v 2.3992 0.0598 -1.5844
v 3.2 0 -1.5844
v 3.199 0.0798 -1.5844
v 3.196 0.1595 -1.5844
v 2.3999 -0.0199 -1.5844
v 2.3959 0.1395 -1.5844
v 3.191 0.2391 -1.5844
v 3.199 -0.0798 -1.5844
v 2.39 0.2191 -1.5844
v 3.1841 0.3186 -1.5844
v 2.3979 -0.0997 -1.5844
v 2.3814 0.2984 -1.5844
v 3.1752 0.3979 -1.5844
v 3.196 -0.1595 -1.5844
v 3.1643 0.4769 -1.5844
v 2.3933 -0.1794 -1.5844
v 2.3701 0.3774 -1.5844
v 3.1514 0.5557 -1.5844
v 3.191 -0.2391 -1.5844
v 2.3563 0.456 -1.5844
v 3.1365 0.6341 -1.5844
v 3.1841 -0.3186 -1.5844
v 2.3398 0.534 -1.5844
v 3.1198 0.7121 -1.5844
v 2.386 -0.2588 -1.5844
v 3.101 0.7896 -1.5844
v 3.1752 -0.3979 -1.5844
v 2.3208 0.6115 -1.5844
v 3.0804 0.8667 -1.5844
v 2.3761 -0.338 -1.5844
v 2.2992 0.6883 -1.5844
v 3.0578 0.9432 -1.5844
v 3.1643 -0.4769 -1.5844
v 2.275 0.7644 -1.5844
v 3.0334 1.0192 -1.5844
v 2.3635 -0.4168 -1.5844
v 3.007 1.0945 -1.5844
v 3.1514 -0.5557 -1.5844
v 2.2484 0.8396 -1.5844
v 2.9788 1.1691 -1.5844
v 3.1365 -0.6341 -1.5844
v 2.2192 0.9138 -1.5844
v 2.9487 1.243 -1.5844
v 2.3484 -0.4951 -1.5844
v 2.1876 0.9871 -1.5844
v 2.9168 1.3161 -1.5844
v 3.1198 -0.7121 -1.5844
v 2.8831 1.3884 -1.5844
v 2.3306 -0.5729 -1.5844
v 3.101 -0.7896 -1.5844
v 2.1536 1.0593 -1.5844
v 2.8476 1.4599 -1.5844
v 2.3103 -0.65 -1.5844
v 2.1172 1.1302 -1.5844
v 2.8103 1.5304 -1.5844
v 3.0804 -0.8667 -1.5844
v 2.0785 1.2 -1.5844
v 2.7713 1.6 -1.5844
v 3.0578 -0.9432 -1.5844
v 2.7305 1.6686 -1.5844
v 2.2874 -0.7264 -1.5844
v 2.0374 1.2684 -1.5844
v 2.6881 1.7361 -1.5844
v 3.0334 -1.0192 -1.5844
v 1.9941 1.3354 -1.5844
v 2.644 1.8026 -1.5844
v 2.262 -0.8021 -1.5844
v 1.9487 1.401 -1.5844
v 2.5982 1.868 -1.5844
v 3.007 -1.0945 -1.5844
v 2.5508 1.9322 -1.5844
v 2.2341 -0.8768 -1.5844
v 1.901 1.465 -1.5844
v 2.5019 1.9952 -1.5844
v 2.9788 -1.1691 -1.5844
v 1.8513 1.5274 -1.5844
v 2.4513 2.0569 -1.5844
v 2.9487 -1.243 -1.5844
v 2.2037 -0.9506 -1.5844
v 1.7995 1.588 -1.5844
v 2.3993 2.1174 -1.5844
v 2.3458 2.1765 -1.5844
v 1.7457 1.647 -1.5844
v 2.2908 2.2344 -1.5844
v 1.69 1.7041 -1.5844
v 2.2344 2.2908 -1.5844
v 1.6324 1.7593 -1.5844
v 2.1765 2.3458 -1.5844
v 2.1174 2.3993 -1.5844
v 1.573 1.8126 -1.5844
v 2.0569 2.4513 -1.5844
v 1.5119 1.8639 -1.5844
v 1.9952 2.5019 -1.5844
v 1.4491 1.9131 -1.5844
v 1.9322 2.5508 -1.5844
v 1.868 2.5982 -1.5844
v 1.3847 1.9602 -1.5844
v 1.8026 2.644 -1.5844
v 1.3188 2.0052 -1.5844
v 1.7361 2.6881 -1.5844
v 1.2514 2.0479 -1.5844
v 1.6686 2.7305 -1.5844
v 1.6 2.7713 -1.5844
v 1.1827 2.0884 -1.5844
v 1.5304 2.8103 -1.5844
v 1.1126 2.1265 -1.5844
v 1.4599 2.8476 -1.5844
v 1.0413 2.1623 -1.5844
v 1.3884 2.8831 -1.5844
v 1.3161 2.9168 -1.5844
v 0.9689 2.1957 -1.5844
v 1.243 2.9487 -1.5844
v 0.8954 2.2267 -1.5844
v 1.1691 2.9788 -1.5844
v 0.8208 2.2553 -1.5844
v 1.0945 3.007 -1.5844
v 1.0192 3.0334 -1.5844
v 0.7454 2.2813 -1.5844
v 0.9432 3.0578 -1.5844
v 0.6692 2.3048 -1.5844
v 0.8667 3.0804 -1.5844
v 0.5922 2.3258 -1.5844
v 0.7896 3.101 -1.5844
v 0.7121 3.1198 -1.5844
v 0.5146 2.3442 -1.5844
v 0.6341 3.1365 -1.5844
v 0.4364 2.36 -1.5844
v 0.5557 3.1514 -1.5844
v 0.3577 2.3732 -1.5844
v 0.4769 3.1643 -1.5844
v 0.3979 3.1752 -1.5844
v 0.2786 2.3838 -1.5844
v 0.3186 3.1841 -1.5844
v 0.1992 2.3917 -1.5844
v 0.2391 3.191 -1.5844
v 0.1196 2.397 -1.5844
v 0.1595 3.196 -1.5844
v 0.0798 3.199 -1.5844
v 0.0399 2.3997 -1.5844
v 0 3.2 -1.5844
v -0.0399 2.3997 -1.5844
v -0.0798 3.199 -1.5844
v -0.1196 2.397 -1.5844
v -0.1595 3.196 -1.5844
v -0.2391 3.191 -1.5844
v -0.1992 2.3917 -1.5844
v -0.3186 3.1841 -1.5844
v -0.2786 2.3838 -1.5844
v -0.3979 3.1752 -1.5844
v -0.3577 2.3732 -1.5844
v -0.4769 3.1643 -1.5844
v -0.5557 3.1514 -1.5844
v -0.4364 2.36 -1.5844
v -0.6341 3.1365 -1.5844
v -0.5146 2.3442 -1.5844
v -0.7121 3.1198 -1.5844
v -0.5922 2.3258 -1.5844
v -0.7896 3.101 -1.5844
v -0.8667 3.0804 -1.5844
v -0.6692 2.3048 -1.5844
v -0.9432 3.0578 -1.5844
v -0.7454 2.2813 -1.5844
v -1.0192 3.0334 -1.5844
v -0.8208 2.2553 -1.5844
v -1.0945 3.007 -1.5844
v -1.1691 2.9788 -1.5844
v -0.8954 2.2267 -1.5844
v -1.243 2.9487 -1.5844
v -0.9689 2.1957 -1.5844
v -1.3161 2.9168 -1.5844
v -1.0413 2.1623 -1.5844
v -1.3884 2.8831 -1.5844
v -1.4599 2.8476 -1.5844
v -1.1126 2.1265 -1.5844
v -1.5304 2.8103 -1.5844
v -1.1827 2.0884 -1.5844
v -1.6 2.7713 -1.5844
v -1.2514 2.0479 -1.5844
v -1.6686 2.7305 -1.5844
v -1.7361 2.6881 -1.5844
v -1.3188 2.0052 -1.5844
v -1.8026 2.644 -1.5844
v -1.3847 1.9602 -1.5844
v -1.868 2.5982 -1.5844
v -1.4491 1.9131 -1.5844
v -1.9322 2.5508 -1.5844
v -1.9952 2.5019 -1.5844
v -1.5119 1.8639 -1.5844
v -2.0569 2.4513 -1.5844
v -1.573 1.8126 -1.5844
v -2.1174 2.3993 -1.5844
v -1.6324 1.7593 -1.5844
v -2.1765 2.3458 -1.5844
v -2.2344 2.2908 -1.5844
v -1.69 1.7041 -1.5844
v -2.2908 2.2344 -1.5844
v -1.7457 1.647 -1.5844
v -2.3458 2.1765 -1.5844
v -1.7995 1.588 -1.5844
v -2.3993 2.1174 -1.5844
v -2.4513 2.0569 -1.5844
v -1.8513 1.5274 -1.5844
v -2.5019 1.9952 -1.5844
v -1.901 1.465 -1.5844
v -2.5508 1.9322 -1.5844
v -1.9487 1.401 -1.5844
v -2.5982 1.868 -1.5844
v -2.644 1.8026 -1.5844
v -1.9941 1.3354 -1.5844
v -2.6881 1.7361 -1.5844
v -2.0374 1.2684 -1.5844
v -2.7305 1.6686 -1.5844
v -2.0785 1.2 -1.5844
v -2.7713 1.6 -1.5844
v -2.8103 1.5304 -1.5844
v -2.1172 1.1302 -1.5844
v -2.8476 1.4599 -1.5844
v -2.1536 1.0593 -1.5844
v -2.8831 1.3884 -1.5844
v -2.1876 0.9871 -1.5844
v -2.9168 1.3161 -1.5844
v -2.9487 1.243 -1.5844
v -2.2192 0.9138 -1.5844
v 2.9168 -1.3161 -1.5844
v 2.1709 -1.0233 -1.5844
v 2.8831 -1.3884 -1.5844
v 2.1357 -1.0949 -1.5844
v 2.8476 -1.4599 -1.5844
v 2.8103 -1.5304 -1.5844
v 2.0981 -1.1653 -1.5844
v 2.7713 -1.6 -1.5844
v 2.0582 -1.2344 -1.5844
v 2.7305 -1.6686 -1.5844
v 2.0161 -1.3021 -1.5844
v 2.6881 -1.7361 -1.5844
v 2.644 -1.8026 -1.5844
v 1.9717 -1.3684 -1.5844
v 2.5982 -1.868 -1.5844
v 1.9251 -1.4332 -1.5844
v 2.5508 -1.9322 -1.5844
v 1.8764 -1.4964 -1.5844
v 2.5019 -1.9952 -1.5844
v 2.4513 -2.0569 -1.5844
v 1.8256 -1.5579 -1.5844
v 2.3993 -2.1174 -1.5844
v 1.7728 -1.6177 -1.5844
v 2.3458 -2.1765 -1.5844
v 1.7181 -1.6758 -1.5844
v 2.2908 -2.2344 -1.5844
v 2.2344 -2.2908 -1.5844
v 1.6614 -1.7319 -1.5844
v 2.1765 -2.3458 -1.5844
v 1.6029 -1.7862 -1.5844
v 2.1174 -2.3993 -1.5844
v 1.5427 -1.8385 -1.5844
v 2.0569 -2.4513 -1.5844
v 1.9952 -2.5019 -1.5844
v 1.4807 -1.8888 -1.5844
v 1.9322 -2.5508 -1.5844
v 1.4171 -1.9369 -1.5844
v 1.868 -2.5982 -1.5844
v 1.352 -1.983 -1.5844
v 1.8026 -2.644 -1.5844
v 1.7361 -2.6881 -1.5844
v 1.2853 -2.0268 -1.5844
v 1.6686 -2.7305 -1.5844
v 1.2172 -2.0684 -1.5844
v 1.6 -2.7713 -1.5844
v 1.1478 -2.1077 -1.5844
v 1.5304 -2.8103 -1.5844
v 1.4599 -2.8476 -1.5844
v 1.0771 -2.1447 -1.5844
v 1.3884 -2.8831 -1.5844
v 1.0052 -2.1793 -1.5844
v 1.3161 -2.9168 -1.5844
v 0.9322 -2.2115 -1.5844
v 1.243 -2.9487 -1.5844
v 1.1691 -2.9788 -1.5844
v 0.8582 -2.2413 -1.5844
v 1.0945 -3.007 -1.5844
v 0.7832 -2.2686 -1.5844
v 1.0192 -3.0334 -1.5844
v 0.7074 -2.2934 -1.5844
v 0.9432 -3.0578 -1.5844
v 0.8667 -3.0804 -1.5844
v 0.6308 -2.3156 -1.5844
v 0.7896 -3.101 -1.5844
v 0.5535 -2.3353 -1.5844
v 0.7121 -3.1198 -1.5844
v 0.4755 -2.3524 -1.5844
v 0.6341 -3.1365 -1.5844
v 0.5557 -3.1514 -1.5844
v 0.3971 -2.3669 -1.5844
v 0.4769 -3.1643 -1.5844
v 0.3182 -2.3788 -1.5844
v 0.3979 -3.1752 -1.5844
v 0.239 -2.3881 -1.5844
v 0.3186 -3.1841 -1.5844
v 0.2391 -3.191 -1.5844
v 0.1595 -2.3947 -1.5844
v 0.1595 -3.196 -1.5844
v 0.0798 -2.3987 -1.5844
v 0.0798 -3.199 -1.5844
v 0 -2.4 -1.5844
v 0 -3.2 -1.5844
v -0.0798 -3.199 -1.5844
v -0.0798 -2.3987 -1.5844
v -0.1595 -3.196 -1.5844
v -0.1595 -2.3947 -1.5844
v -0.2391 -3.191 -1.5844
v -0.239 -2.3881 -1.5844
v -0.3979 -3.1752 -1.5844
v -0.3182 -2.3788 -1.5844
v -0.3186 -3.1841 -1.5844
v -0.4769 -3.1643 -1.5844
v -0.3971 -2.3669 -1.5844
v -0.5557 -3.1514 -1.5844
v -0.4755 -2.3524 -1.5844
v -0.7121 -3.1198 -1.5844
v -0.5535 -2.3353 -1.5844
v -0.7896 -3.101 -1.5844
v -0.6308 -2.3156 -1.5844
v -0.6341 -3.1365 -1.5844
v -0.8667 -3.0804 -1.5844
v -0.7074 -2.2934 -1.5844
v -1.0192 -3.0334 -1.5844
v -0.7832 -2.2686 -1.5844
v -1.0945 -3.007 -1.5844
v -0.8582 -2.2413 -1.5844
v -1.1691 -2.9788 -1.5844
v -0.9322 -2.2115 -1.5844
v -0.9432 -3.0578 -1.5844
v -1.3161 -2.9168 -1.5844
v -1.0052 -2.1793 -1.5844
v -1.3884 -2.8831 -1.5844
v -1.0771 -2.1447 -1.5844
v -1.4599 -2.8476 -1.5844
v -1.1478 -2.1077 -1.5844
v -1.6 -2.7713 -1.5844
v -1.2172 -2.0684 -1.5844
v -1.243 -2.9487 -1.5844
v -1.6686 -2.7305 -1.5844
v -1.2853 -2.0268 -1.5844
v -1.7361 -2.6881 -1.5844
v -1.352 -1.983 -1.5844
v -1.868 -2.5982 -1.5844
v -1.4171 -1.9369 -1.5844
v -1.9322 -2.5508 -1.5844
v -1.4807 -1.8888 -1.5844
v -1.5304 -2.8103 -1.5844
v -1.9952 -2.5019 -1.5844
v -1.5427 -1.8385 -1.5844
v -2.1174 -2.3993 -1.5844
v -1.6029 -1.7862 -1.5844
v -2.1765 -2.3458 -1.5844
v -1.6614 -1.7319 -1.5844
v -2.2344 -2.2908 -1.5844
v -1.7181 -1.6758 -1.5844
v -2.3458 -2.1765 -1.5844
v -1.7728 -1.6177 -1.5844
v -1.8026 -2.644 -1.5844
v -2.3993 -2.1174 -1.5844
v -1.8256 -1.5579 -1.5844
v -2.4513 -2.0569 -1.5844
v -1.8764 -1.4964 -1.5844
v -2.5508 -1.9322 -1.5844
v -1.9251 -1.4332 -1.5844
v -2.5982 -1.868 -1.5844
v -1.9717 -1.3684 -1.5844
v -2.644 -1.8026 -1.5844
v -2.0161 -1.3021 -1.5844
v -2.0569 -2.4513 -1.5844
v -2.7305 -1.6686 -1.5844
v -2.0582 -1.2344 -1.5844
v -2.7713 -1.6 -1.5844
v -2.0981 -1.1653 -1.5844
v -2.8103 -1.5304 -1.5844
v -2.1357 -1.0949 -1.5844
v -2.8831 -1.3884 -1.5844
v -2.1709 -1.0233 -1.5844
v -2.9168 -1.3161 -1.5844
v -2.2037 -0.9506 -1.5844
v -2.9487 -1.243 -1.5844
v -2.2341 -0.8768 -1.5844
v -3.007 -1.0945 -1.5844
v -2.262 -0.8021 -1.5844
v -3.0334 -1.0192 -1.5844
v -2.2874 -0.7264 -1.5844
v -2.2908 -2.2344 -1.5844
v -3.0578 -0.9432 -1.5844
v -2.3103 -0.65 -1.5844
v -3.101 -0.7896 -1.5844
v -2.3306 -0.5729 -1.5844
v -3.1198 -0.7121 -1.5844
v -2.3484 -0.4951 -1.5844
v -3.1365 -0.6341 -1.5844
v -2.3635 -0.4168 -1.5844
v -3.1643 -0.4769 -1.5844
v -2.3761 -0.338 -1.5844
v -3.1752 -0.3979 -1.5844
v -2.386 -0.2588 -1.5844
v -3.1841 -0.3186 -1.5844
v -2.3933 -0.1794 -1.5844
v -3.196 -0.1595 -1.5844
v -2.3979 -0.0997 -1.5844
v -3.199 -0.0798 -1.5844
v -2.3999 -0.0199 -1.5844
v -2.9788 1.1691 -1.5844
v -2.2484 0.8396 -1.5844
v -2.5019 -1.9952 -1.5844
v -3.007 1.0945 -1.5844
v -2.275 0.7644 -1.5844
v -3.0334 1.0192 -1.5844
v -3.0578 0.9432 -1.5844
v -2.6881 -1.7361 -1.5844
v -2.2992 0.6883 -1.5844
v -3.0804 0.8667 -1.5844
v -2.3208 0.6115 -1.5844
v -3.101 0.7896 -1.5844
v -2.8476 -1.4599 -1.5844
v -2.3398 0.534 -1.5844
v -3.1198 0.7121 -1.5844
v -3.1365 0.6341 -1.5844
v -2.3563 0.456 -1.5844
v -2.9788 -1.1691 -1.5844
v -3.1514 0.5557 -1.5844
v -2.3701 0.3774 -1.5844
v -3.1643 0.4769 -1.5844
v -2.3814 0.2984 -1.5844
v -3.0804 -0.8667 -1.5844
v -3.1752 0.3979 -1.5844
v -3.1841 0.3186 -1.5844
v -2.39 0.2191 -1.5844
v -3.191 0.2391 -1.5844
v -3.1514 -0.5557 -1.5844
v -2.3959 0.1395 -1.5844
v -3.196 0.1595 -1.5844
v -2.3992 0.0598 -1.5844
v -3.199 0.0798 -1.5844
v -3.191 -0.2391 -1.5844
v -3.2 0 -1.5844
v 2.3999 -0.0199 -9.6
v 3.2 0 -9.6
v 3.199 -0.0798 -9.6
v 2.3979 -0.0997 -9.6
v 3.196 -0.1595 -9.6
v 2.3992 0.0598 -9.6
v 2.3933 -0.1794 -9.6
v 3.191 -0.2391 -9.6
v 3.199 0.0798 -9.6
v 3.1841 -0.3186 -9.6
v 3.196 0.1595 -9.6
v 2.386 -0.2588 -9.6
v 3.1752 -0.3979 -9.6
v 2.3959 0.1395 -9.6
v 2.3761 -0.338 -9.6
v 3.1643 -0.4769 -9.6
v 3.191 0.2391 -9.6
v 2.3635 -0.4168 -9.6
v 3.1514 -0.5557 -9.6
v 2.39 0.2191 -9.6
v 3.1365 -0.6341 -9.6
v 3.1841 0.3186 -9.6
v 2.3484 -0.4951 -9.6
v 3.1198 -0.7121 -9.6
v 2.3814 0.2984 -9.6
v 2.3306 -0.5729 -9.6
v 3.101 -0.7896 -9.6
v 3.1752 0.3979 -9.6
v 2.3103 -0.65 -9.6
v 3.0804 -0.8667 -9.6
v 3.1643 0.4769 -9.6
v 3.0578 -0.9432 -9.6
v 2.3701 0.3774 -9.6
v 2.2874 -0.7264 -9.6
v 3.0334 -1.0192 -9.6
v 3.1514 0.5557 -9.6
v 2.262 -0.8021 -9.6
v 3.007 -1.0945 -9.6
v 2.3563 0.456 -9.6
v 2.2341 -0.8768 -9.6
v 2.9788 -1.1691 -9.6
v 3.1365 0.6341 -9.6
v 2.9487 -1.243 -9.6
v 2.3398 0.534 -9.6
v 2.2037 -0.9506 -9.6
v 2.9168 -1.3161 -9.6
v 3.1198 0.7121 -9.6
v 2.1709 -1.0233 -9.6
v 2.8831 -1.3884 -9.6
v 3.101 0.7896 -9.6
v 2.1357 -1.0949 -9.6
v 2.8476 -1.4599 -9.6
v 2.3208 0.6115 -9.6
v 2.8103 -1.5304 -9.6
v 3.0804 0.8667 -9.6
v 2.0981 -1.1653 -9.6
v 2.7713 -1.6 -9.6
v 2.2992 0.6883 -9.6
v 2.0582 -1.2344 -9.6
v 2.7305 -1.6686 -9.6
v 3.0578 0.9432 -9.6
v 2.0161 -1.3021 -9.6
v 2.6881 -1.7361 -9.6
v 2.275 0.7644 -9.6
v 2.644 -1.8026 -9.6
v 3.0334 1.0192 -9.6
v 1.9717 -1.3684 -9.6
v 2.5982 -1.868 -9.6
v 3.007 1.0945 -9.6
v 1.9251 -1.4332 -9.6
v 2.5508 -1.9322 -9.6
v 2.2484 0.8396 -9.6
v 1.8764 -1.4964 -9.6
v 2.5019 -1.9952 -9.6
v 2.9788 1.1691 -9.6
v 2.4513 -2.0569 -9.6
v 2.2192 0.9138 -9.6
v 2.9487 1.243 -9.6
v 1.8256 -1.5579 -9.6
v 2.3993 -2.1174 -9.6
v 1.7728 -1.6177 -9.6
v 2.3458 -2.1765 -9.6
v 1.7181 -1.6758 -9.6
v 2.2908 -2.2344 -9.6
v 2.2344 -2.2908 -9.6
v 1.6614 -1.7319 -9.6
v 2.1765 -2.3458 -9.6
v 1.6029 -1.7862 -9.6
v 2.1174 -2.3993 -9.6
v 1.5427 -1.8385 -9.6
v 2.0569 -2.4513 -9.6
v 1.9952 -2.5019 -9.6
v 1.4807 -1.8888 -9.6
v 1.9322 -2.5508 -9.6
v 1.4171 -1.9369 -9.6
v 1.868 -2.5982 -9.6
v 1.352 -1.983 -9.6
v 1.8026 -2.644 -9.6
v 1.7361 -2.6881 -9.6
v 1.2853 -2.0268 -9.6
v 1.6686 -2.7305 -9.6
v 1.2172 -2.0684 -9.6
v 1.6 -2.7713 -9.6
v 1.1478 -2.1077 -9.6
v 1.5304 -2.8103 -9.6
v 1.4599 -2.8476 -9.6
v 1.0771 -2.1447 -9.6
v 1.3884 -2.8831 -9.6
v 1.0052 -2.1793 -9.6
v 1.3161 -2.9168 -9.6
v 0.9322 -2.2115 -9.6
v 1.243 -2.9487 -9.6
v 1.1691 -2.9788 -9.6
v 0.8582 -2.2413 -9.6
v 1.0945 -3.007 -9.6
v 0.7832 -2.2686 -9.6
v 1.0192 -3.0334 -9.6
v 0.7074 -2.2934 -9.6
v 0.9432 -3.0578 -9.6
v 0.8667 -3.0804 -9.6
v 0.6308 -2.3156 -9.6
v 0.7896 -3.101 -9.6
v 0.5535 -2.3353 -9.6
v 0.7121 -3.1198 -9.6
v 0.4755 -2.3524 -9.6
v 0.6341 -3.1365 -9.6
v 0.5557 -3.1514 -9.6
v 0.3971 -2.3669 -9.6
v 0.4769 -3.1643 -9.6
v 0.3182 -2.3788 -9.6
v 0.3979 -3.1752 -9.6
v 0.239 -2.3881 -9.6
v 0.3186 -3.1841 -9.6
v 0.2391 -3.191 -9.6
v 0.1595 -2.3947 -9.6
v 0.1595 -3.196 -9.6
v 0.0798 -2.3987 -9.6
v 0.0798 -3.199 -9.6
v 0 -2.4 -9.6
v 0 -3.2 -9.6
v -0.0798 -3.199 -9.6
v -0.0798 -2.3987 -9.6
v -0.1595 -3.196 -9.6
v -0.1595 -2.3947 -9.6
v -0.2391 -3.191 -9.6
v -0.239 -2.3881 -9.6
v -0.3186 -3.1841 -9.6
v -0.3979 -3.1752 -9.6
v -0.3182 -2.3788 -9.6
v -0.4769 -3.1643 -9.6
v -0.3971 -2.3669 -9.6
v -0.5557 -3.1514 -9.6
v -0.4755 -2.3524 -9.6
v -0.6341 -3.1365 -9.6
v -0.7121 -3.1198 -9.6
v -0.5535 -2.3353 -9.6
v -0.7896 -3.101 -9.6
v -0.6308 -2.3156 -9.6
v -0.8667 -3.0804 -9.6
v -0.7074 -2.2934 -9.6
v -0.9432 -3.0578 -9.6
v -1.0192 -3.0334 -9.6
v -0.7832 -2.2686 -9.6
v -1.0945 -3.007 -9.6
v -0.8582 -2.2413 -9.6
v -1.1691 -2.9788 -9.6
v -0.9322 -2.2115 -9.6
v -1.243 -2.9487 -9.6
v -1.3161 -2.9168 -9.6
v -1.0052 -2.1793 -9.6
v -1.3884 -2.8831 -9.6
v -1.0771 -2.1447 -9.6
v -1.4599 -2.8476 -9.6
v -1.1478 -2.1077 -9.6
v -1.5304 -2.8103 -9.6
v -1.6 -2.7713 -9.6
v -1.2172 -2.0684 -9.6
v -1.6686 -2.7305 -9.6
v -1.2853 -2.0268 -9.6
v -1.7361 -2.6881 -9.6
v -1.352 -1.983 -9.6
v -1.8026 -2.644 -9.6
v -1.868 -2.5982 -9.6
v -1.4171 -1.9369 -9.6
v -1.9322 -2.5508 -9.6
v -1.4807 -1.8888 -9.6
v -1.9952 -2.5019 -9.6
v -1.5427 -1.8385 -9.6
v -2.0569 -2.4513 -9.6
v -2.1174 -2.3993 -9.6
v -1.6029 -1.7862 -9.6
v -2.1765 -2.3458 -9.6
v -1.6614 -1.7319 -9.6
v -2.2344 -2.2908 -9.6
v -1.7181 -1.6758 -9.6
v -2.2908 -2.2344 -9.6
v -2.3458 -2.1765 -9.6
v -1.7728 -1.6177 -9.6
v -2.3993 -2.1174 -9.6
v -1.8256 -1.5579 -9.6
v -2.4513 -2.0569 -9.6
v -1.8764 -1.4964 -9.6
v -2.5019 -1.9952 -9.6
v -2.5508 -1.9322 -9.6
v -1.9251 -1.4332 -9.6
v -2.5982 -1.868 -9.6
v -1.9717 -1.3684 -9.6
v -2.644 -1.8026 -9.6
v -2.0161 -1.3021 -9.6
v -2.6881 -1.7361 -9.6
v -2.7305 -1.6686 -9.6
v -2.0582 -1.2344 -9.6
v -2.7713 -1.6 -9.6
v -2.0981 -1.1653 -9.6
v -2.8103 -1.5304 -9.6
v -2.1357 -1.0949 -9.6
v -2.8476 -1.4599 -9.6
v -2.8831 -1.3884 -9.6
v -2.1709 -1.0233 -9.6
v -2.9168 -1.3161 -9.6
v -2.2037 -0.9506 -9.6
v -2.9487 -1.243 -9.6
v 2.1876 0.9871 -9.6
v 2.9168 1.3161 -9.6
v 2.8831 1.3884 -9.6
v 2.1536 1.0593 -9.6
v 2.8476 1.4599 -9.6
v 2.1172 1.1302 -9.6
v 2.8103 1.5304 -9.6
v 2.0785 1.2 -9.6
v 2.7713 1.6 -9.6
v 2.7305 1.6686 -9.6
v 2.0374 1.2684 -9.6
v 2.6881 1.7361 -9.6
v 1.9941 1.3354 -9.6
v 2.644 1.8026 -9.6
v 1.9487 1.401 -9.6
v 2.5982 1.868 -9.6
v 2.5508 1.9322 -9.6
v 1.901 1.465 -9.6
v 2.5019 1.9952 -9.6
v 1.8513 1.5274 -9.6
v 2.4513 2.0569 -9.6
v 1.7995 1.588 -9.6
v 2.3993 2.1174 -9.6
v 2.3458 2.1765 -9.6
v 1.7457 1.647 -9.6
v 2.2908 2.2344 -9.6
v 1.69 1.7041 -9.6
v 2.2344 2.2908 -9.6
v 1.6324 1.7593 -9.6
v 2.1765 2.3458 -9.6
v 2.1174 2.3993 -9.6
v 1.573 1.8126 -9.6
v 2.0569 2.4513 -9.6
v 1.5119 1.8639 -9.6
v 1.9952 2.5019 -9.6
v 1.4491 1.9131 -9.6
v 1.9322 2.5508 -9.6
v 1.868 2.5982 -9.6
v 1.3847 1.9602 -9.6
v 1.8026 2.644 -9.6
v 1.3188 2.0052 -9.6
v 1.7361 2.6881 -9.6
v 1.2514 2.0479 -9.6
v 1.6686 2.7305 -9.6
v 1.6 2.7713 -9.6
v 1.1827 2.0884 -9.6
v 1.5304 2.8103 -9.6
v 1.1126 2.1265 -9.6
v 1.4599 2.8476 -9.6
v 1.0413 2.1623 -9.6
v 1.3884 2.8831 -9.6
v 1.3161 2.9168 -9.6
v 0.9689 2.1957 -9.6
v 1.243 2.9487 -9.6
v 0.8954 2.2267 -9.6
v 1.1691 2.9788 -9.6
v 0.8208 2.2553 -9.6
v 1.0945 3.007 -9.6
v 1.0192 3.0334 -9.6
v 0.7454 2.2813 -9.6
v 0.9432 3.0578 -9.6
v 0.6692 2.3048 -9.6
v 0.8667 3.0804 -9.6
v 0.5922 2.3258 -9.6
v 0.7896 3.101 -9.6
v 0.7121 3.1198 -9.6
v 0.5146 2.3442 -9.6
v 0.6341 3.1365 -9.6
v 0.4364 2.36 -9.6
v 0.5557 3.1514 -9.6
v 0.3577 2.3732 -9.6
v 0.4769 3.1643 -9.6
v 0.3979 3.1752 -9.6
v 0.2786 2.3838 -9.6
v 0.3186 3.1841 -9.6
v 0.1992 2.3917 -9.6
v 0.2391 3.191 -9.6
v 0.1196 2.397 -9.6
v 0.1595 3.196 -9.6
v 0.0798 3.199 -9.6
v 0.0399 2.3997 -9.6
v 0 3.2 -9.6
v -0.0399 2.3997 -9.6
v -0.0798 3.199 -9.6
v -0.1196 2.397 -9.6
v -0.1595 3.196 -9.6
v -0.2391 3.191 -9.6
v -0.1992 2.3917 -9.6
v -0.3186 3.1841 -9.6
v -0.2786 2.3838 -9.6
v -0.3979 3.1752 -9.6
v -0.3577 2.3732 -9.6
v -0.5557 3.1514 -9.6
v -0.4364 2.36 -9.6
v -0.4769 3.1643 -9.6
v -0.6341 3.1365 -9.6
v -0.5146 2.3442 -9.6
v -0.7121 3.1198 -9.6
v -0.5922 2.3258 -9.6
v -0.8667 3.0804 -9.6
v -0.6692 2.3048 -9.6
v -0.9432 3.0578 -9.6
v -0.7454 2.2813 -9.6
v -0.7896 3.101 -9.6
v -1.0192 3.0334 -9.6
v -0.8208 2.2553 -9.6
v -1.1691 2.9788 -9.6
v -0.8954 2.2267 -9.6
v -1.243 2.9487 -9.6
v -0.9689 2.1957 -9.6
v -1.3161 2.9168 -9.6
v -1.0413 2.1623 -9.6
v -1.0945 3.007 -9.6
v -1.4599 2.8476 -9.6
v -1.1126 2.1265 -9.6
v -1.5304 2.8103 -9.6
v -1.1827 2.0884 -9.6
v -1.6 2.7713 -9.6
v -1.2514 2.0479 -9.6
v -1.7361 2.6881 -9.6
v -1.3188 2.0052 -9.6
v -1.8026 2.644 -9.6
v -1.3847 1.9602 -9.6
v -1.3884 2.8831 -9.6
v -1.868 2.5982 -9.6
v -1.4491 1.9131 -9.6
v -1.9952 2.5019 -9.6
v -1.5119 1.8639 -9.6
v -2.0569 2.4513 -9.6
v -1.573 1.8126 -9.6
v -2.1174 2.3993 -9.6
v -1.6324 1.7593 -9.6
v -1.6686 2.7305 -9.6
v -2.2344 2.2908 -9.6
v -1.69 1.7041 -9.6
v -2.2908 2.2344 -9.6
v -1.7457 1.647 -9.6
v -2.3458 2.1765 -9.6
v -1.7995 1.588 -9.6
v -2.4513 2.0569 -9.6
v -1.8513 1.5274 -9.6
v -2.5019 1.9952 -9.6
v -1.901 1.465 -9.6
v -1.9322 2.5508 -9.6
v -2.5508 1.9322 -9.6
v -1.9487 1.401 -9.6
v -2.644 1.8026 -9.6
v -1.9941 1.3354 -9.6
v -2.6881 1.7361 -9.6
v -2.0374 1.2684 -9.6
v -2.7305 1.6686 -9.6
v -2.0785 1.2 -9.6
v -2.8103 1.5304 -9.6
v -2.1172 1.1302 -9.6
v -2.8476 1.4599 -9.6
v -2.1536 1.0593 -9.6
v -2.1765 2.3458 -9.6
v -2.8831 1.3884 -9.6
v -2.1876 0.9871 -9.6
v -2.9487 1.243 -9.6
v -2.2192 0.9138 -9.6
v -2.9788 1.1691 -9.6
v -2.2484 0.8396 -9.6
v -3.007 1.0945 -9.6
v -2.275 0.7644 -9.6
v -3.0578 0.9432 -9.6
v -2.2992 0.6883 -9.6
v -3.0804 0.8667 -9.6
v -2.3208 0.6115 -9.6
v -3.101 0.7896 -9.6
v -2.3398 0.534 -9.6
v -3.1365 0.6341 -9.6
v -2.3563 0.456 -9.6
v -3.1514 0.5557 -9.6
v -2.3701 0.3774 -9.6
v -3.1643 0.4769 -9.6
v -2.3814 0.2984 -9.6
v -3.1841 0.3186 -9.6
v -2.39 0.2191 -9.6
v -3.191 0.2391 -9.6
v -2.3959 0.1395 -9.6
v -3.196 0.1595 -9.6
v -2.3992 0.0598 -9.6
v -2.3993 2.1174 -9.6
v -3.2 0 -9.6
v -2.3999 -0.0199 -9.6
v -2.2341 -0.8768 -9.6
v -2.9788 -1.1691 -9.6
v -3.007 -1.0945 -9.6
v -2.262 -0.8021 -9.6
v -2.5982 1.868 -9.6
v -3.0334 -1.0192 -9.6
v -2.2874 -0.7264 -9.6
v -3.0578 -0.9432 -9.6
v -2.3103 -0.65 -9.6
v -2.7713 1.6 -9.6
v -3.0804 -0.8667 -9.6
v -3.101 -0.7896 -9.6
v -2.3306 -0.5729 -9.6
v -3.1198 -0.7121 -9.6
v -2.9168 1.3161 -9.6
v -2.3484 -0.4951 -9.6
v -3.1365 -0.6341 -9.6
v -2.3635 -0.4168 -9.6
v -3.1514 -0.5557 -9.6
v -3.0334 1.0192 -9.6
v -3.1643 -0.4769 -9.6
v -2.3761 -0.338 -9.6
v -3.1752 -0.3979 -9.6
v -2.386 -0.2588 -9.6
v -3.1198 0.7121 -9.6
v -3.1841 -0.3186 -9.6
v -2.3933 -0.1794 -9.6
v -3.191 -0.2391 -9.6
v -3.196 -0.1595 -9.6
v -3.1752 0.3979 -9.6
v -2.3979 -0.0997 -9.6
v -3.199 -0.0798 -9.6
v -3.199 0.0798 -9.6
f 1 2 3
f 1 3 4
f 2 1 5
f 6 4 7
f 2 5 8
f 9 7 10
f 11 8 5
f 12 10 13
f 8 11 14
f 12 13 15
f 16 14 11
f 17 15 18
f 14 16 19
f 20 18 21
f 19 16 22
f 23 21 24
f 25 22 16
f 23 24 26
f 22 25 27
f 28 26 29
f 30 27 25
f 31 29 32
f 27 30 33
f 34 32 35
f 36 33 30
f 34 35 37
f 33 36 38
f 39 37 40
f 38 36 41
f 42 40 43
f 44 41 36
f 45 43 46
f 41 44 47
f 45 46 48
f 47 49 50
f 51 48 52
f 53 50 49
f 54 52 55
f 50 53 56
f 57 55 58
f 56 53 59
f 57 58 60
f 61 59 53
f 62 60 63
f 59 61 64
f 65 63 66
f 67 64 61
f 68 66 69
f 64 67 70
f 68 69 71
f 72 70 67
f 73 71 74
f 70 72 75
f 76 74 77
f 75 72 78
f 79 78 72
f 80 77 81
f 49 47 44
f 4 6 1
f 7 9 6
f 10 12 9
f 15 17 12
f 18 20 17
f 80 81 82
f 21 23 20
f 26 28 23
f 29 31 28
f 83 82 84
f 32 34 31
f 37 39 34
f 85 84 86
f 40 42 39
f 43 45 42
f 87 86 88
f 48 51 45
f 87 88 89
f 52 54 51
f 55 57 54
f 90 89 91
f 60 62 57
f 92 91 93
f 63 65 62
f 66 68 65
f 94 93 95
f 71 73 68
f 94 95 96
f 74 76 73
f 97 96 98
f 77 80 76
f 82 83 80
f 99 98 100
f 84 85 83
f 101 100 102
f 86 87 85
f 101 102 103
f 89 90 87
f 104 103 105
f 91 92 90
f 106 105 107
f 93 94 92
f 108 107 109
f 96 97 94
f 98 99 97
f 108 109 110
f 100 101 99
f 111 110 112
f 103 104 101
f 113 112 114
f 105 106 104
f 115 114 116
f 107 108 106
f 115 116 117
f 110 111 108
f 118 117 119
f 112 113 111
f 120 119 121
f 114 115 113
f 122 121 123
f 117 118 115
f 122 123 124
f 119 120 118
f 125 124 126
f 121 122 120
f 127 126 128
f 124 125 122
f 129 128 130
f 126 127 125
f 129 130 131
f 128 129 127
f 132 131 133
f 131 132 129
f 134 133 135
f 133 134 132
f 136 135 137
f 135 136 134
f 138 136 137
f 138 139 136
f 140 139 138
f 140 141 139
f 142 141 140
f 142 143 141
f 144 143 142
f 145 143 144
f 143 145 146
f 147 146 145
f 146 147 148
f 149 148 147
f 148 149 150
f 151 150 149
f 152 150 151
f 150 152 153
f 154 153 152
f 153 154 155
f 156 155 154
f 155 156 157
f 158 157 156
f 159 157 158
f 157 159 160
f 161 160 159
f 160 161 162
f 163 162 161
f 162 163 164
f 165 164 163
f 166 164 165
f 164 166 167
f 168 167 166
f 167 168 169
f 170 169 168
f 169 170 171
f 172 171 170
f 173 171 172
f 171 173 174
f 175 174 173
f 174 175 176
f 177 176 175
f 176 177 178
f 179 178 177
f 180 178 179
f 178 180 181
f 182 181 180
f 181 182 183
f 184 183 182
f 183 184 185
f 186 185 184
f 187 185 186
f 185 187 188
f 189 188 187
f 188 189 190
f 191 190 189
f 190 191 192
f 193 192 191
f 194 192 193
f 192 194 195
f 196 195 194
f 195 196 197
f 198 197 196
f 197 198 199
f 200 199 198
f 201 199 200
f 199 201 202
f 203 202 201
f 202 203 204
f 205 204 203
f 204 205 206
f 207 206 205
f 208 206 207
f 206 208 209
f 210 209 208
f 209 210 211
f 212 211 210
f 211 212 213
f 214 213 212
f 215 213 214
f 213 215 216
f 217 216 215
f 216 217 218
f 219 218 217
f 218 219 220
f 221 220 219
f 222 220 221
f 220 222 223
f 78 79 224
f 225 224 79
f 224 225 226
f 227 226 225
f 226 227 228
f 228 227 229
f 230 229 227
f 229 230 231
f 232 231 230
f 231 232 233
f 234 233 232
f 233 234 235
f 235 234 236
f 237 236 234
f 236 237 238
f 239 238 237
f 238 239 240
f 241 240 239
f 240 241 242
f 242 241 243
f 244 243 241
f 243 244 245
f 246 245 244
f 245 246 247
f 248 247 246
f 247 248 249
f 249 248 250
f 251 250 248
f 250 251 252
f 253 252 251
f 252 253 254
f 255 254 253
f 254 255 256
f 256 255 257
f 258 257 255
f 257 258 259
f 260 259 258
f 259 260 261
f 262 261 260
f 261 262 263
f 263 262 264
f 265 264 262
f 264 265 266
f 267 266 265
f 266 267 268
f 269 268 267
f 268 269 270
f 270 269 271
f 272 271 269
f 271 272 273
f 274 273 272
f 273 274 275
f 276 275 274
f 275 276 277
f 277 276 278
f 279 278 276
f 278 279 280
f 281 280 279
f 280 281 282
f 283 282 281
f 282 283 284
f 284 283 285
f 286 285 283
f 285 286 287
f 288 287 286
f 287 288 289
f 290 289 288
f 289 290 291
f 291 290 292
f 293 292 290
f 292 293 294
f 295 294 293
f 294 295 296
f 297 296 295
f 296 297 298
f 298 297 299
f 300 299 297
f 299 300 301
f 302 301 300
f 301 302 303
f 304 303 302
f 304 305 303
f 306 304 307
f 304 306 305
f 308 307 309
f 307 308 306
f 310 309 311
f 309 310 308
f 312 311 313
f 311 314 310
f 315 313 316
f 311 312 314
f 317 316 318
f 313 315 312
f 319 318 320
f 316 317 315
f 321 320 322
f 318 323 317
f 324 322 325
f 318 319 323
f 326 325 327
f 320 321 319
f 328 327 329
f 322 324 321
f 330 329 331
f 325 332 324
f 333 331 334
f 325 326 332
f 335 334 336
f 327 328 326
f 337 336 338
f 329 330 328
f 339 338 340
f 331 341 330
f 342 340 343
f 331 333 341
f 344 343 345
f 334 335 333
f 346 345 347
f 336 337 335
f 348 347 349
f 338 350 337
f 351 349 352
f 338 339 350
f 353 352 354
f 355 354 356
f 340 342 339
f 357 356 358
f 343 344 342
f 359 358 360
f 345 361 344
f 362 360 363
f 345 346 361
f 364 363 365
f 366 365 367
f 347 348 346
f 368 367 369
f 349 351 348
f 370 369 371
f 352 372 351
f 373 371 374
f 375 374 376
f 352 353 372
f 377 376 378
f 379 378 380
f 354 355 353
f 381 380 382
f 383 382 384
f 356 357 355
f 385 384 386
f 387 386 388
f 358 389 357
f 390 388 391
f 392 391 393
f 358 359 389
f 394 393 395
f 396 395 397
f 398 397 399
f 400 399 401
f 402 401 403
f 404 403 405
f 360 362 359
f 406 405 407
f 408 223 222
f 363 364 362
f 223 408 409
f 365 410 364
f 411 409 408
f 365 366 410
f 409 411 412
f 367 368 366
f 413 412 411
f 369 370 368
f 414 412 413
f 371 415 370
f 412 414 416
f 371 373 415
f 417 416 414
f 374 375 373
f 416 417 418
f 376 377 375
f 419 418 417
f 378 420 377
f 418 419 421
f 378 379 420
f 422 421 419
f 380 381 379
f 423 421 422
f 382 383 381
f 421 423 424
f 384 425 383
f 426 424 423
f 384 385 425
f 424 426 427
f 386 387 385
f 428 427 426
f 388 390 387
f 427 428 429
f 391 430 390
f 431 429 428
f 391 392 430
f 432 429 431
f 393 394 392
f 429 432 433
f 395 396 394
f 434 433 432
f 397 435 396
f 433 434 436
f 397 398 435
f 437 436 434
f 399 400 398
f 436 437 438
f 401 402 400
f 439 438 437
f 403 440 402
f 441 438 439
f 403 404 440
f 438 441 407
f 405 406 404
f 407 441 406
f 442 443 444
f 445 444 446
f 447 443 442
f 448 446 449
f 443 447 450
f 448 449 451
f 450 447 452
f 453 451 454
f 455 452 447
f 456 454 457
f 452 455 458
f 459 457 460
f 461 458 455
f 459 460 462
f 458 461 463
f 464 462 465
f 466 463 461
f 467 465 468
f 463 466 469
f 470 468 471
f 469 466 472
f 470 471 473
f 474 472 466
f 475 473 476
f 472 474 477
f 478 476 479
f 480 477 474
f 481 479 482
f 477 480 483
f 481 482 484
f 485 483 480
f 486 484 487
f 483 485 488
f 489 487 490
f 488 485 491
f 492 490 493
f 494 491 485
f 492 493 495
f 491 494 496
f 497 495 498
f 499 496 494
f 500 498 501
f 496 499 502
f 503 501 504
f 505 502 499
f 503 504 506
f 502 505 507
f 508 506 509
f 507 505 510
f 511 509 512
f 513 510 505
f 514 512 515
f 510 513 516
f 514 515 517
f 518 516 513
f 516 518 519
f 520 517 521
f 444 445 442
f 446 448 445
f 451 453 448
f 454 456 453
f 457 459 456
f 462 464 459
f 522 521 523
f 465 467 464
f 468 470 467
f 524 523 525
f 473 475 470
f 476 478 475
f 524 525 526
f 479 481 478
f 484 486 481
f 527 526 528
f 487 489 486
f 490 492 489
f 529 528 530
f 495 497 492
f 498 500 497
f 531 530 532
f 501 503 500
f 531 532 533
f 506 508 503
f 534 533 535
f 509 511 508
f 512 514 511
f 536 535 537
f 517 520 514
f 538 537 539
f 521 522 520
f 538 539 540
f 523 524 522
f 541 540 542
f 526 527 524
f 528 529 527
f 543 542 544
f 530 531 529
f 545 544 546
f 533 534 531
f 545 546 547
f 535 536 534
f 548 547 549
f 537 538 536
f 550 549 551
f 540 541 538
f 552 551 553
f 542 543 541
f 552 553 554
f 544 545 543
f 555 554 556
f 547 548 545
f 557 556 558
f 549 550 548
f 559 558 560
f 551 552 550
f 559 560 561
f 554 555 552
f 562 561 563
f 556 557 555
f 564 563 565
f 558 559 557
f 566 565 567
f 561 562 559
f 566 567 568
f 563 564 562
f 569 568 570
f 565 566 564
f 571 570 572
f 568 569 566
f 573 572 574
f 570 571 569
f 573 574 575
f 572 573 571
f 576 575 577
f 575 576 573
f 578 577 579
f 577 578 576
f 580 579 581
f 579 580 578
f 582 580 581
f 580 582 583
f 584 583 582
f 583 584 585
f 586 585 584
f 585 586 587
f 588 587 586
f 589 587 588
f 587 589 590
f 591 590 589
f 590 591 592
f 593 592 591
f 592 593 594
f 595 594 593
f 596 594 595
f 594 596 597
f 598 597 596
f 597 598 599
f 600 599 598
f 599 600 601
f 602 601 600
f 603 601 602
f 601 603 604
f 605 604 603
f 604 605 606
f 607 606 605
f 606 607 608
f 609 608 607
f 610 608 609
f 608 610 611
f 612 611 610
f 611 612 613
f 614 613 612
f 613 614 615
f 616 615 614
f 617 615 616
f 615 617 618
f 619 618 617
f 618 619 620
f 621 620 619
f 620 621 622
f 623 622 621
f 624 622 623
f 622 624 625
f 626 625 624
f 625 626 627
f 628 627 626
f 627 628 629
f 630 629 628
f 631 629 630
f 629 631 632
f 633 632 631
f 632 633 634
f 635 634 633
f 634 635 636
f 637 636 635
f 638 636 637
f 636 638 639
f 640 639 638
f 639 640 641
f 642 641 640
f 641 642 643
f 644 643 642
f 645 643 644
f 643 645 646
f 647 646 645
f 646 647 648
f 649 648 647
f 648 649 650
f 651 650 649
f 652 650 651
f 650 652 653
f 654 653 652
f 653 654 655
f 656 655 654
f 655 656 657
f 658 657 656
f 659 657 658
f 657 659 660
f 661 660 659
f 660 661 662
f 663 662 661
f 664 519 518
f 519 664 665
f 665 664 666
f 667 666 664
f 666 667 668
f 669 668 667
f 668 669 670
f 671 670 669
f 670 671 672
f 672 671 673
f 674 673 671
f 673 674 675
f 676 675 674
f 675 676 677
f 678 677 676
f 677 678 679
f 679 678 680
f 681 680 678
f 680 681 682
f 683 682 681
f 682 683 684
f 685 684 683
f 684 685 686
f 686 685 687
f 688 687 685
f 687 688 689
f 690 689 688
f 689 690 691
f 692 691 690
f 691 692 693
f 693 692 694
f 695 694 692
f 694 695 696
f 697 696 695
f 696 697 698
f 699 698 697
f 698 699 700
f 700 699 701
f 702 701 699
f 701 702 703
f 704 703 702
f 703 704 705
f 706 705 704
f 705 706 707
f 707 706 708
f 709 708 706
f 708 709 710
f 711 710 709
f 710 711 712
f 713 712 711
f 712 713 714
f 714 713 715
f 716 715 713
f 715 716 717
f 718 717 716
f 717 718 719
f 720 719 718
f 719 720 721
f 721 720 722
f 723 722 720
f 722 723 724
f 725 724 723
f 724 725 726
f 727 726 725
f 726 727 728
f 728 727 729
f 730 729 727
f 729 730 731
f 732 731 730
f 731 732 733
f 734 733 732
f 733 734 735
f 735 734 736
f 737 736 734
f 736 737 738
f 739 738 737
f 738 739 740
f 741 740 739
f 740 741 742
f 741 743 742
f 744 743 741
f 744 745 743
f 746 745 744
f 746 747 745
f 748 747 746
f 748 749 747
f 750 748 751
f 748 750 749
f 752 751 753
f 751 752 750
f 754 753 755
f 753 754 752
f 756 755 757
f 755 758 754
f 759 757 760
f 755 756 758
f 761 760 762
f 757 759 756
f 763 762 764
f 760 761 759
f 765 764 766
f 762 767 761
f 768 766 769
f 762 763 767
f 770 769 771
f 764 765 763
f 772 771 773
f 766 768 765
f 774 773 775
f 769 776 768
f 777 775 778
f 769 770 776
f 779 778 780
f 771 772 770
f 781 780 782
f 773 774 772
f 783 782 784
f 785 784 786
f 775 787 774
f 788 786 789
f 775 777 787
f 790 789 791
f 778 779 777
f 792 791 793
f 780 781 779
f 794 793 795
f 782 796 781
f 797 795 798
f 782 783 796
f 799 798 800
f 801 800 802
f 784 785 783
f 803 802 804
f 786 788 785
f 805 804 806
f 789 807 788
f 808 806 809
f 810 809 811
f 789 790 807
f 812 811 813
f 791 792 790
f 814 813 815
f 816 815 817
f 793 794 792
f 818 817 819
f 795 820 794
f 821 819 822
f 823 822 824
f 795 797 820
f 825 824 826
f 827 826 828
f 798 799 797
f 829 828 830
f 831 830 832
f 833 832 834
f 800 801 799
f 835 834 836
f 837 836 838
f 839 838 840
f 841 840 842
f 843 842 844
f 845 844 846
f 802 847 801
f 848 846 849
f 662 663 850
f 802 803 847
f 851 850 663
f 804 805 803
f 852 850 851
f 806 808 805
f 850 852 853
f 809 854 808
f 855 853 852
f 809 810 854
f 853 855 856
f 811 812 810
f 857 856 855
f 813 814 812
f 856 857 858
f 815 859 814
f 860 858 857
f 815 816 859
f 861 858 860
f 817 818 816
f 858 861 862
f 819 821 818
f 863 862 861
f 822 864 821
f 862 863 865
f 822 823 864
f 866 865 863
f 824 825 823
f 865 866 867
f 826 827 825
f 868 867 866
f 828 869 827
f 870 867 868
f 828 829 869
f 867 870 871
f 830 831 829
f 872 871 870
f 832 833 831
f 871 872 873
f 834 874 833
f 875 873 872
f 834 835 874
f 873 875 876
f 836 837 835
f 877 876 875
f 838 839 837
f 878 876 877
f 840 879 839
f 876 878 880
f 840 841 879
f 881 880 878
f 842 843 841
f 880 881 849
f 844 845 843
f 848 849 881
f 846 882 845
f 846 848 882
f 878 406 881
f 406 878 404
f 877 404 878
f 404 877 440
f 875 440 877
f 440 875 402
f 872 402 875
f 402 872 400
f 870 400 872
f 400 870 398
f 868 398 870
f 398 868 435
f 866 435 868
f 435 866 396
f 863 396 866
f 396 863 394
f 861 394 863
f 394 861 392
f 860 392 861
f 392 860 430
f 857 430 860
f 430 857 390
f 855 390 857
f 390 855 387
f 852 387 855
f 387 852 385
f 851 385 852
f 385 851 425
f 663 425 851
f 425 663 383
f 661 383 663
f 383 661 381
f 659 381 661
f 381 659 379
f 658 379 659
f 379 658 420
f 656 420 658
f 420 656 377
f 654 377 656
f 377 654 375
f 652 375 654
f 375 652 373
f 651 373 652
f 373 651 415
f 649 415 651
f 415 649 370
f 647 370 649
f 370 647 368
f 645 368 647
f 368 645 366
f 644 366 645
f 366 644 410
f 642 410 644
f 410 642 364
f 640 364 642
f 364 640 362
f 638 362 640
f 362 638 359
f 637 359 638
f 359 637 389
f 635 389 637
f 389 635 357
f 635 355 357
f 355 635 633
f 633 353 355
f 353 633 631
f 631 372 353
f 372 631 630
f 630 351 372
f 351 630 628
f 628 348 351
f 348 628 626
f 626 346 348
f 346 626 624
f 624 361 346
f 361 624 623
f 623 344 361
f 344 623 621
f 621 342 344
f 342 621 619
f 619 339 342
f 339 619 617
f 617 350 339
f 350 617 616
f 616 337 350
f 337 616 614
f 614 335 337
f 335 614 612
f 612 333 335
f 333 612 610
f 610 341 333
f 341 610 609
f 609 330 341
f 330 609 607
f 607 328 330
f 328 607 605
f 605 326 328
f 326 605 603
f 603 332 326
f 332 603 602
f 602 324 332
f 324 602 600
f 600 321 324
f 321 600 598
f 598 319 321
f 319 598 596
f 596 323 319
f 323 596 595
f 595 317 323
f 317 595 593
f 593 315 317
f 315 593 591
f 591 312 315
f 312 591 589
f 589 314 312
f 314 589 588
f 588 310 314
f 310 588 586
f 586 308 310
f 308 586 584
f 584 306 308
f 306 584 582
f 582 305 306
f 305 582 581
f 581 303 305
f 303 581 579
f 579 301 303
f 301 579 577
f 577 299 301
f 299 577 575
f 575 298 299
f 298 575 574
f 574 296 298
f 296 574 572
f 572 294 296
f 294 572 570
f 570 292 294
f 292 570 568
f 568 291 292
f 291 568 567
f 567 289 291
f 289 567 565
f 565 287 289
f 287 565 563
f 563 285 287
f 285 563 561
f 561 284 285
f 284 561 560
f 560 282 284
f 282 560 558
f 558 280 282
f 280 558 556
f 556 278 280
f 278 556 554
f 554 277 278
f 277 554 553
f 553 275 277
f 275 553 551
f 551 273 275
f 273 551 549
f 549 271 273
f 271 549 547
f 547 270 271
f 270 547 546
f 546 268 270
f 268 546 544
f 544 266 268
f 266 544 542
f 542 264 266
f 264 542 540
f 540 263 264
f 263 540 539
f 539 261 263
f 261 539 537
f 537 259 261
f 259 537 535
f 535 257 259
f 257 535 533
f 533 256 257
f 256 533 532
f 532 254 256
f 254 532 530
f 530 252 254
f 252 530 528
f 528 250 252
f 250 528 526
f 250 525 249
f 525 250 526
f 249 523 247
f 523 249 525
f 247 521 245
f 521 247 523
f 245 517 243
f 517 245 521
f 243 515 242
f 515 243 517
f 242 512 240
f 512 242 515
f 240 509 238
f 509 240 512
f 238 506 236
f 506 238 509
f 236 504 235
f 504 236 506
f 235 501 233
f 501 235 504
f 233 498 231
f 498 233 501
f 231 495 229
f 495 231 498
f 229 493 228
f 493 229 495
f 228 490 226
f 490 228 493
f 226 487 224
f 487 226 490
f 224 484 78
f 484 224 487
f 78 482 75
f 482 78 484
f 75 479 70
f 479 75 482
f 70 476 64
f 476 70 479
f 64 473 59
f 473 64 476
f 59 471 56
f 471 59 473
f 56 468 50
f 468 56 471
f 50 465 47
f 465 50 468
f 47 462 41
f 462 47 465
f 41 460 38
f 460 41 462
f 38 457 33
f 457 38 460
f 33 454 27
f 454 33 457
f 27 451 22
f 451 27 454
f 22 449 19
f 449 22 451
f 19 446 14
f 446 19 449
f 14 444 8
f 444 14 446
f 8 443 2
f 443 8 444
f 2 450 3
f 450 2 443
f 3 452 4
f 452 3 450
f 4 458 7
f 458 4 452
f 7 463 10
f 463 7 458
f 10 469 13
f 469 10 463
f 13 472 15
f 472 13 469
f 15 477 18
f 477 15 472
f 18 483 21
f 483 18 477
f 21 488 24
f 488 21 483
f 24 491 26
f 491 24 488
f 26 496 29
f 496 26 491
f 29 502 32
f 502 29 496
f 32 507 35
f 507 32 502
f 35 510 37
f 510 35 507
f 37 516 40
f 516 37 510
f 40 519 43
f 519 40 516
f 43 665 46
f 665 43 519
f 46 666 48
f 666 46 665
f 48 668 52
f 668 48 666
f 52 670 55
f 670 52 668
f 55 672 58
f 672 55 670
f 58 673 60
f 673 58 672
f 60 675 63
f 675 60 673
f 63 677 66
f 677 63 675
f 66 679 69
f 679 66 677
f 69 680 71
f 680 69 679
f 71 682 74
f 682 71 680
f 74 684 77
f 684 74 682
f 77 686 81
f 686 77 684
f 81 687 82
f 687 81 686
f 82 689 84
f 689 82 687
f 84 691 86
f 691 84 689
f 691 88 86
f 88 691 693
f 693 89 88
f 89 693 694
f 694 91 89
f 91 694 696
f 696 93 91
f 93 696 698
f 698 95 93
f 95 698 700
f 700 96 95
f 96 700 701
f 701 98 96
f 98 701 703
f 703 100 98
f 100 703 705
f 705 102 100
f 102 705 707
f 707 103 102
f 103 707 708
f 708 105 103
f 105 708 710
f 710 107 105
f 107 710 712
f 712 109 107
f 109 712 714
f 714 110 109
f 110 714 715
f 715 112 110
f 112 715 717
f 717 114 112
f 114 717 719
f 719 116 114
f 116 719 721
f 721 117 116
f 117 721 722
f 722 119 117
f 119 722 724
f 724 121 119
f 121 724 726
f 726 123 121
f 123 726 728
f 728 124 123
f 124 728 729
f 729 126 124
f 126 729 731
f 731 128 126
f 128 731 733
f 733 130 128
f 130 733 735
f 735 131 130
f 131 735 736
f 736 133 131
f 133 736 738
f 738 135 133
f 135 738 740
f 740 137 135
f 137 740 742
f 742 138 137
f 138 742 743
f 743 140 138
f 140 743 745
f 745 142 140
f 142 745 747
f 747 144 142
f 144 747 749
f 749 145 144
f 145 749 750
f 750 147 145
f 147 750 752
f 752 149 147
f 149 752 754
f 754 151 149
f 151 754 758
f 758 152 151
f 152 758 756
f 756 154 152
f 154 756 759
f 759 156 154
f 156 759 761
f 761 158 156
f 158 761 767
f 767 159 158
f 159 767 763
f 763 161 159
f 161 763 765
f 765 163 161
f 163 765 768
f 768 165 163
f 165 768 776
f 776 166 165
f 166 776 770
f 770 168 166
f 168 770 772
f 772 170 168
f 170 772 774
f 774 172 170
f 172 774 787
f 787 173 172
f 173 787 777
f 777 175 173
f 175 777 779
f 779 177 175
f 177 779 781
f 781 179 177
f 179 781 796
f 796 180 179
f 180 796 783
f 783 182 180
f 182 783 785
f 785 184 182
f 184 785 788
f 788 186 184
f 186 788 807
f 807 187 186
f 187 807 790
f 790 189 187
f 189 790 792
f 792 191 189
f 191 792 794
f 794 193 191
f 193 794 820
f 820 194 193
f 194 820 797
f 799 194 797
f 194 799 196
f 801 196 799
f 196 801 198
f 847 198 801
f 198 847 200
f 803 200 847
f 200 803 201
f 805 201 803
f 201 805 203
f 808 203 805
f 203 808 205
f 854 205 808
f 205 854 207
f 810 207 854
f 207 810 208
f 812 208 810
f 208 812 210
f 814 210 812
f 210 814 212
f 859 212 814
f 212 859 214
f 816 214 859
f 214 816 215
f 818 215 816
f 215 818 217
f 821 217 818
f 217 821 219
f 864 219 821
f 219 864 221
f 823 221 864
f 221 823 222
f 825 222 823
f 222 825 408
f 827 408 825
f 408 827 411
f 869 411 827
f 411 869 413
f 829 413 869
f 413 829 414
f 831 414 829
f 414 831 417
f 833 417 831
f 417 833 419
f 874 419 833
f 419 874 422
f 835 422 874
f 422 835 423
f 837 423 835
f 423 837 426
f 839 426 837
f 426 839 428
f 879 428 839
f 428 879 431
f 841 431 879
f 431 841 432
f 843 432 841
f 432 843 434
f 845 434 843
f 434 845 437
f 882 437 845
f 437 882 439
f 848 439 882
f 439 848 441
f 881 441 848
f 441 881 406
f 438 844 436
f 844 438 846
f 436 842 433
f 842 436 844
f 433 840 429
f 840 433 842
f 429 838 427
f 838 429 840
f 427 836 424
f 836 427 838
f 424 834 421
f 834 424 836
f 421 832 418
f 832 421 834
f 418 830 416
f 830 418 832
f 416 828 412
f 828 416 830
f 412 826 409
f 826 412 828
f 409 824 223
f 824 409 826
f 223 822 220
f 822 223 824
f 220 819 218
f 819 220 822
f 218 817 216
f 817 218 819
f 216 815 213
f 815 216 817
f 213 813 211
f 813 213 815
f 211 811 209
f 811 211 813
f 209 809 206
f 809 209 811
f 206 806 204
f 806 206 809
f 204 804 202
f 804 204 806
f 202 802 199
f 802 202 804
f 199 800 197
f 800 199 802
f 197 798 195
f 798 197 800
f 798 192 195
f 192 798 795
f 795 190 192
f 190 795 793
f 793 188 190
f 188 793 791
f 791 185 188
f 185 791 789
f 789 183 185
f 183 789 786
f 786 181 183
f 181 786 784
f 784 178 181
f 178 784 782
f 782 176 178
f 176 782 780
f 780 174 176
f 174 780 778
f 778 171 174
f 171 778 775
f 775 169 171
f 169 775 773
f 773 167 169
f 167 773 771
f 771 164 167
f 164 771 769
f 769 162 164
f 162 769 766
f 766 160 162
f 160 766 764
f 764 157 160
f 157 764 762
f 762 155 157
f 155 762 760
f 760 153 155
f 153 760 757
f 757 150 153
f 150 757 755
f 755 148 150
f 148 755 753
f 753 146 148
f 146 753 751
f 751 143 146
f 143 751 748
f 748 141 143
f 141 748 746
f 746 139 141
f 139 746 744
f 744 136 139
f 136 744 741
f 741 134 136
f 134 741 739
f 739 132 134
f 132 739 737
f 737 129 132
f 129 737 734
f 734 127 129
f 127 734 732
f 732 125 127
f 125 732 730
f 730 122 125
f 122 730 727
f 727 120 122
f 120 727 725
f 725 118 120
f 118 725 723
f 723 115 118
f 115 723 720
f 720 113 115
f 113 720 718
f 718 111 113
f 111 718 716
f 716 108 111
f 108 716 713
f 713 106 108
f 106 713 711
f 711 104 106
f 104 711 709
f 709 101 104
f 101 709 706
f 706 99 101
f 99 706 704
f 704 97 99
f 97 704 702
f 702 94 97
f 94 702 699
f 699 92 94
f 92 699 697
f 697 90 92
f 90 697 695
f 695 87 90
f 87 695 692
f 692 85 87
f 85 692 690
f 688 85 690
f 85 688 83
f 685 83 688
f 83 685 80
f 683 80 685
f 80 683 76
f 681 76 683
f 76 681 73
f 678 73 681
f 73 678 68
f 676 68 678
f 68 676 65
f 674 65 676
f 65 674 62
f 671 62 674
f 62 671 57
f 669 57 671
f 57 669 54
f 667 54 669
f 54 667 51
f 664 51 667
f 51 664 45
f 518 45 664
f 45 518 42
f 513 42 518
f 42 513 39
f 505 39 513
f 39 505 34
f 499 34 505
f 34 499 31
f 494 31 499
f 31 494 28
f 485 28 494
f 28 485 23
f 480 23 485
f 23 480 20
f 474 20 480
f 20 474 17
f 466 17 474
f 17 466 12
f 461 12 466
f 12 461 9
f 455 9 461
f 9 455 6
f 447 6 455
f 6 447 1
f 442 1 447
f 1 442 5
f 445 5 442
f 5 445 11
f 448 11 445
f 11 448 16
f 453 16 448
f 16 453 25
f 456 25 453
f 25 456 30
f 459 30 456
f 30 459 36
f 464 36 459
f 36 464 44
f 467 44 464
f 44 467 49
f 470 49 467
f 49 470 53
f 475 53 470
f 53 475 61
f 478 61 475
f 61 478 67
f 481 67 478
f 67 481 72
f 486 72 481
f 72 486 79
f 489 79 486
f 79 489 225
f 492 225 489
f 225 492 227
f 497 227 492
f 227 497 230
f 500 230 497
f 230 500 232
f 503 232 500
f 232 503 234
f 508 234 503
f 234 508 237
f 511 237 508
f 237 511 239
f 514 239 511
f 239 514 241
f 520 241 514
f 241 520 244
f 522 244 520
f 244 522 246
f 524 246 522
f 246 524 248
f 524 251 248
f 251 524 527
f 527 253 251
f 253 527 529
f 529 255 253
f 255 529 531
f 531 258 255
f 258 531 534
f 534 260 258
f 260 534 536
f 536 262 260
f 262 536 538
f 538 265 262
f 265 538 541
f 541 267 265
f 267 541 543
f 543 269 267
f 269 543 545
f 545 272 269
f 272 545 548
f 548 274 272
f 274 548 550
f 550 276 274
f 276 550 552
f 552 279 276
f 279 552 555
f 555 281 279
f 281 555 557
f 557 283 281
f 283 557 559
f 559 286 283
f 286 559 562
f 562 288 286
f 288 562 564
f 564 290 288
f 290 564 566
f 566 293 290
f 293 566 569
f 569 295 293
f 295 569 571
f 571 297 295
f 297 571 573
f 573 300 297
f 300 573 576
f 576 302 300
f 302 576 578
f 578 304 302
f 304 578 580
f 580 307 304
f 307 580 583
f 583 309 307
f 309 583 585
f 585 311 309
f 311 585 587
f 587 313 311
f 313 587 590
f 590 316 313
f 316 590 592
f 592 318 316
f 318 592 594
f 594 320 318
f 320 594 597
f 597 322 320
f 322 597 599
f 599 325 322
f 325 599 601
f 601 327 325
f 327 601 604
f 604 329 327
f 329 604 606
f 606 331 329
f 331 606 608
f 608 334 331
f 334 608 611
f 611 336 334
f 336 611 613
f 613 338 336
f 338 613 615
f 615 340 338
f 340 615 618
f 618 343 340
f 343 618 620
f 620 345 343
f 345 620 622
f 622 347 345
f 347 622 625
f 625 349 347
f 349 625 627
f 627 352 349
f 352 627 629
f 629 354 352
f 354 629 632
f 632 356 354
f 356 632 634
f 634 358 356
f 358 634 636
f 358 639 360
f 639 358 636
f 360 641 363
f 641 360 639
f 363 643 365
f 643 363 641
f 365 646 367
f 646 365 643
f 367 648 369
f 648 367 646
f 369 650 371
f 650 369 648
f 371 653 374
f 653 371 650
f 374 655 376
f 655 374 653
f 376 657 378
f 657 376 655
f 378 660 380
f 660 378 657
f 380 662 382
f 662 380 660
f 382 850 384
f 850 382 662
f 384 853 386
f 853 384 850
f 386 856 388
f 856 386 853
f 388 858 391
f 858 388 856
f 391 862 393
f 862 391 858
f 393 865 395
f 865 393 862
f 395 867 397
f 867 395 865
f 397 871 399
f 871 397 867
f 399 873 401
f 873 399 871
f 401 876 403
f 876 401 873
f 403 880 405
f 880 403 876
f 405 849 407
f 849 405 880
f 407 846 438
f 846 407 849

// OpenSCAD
use <../lib.scad>
use <30640.scad>
use <30663.scad>
$fa=1; $fs=0.2;
function ldraw_lib__30640c01(realsolid=false) = [
// 0 Car Steering Wheel Holder  2 x  2 (Complete)
// 0 Name: 30640c01.dat
// 0 Author: Massimo Maso [Sirio]
// 0 !LDRAW_ORG Shortcut UPDATE 2015-01
// 0 !LICENSE Licensed under CC BY 2.0 and CC BY 4.0 : see CAreadme.txt
// 
// 0 BFC CERTIFY CW
  [0,"BFC","CERTIFY"],
  [0,"BFC","CW"],
// 
// 0 !HISTORY 2015-10-11 [PTadmin] Official Update 2015-01
// 
// 
// 1 16 0 0 0 1 0 0 0 1 0 0 0 1 30640.dat
  [1,16,0,0,0,1,0,0,0,1,0,0,0,1, ldraw_lib__30640(realsolid)],
// 1 0 0 -19.799 11.515 1 0 0 0 0.707107 0.707107 0 -0.707107 0.707107 30663.dat
  [1,0,0,-19.799,11.515,1,0,0,0,0.707107,0.707107,0,-0.707107,0.707107, ldraw_lib__30663(realsolid)],
];
module ldraw_lib__30640c01(step=0, col=false, unit=2/5, alt=false, line=0.2, solid=!$preview)
    makepoly(ldraw_lib__30640c01(solid), step=step, col=col, unit=unit, alt=alt, line=line, solid=solid);
ldraw_lib__30640c01(line=0.2);
